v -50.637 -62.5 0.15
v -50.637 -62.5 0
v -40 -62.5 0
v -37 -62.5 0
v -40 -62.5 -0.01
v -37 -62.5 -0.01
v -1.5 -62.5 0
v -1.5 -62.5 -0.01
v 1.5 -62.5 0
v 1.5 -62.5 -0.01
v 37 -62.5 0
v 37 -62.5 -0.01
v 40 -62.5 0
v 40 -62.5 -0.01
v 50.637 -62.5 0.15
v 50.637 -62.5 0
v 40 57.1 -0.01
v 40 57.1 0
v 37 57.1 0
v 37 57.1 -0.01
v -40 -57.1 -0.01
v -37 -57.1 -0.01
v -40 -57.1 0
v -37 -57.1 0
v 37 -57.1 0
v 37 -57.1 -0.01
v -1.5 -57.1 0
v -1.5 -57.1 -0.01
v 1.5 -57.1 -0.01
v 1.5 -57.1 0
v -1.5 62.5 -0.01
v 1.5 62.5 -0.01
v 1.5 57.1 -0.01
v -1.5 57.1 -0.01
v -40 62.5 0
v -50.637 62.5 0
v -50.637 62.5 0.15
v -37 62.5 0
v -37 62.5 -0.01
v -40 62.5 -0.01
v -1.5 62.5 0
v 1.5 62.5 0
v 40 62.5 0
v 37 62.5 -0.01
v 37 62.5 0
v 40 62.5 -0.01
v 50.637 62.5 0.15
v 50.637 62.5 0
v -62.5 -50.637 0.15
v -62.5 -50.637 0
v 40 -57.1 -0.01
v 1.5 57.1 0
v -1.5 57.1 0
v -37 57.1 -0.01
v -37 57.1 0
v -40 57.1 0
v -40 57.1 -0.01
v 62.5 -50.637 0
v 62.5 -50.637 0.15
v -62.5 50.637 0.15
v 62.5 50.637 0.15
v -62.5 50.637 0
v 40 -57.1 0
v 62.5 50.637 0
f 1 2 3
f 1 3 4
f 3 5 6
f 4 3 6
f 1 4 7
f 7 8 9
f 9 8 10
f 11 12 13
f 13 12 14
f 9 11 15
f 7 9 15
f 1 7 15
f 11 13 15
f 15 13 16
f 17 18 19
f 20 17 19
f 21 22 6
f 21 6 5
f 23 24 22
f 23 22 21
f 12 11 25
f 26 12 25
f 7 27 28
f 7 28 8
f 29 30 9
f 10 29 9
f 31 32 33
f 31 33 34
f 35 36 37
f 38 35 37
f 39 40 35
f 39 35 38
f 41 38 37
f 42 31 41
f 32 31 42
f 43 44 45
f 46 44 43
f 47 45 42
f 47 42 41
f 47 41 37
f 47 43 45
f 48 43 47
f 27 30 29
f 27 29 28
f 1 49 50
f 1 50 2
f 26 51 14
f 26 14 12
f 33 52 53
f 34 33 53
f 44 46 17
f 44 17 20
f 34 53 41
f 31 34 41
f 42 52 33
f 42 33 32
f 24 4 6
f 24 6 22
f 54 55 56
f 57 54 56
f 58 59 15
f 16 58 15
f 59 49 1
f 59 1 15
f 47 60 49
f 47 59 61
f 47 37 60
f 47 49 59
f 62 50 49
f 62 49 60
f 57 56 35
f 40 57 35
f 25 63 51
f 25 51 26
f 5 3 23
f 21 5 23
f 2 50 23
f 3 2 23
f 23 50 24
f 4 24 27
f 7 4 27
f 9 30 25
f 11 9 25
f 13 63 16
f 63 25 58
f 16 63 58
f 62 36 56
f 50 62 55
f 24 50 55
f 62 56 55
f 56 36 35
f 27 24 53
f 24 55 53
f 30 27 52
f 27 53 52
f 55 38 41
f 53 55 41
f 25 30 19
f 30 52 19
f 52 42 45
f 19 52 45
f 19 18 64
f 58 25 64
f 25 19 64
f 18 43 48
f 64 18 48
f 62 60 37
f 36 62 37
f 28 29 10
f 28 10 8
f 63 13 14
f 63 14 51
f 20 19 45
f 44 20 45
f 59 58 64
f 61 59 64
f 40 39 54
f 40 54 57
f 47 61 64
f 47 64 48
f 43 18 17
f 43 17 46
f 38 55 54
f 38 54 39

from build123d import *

# Parameters (mm, degrees)
SKETCH1_W               = 125
SKETCH1_H               = 125
BOSS_EXTRUDE1_DEPTH     = 0.15
CUT_EXTRUDE1_DEPTH      = 89.388474927
MIRROR2_COPY_1_DEPTH    = 89.388474927
SKETCH4_W               = 3
SKETCH4_H               = 5.4
BOSS_EXTRUDE2_DEPTH     = 0.01
LPATTERN1_COUNT         = 2
LPATTERN1_PITCH         = 38.5
LPATTERN1_COL_COUNT     = 2
LPATTERN1_COL_PITCH     = 38.5
MIRROR3_COPY_1_SKETCH_W = 3
MIRROR3_COPY_1_SKETCH_H = 5.4
MIRROR3_COPY_1_DEPTH    = 0.01
MIRROR3_COPY_2_SKETCH_W = 3
MIRROR3_COPY_2_SKETCH_H = 5.4
MIRROR3_COPY_2_DEPTH    = 0.01


with BuildPart() as part:
    # Sketch1 → Boss-Extrude1 (new body)
    with BuildSketch(Plane.XY):
        Rectangle(SKETCH1_W, SKETCH1_H)
    extrude(amount=BOSS_EXTRUDE1_DEPTH)

    # Sketch2 → Cut-Extrude1 (cut, through all)
    with BuildSketch(Plane.XY.offset(0.15)):
        Polygon((-62.5, 50.63708499), (-50.63708499, 62.5), (-62.5, 62.5), align=None)
    cut_extrude1 = extrude(amount=-CUT_EXTRUDE1_DEPTH, mode=Mode.SUBTRACT)

    # Mirror1: Cut-Extrude1 across plane
    add(cut_extrude1.mirror(Plane.ZX), mode=Mode.SUBTRACT)

    # Mirror2: Cut-Extrude1 across plane
    add(cut_extrude1.mirror(Plane(origin=(0, 0, 0), x_dir=(0, 0, 1), z_dir=(1, 0, 0))), mode=Mode.SUBTRACT)

    # Mirror2 copy 1 sketch → Mirror2 copy 1 (cut, through all)
    with BuildSketch(Plane(origin=(0, 0, 0.15), x_dir=(-1, 0, 0), z_dir=(0, 0, 1))):
        Polygon((-62.5, 50.63708499), (-50.63708499, 62.5), (-62.5, 62.5), align=None)
    extrude(amount=-MIRROR2_COPY_1_DEPTH, mode=Mode.SUBTRACT)

    # Sketch4 → Boss-Extrude2 (add)
    with BuildSketch(Plane(origin=(0, 0, 0), x_dir=(-1, 0, 0), z_dir=(0, 0, -1))):
        with Locations((0, 59.8)):
            Rectangle(SKETCH4_W, SKETCH4_H)
    boss_extrude2 = extrude(amount=BOSS_EXTRUDE2_DEPTH)

    # LPattern1: Boss-Extrude2 ×2
    with Locations(*[(-i * LPATTERN1_PITCH, 0, 0) for i in range(1, LPATTERN1_COUNT)]):
        add(boss_extrude2)

    # LPattern1 col: Boss-Extrude2 ×2
    with Locations(*[(i * LPATTERN1_COL_PITCH, 0, 0) for i in range(1, LPATTERN1_COL_COUNT)]):
        add(boss_extrude2)

    # Mirror3: Boss-Extrude2 across plane
    add(boss_extrude2.mirror(Plane.ZX))

    # Mirror3 copy 1 sketch → Mirror3 copy 1 (add)
    with BuildSketch(Plane(origin=(-38.5, 0, 0), x_dir=(-1, 0, 0), z_dir=(0, 0, -1))):
        with Locations((0, -59.8)):
            Rectangle(MIRROR3_COPY_1_SKETCH_W, MIRROR3_COPY_1_SKETCH_H)
    extrude(amount=MIRROR3_COPY_1_DEPTH)

    # Mirror3 copy 2 sketch → Mirror3 copy 2 (add)
    with BuildSketch(Plane(origin=(38.5, 0, 0), x_dir=(-1, 0, 0), z_dir=(0, 0, -1))):
        with Locations((0, -59.8)):
            Rectangle(MIRROR3_COPY_2_SKETCH_W, MIRROR3_COPY_2_SKETCH_H)
    extrude(amount=MIRROR3_COPY_2_DEPTH)


solid = part.part
